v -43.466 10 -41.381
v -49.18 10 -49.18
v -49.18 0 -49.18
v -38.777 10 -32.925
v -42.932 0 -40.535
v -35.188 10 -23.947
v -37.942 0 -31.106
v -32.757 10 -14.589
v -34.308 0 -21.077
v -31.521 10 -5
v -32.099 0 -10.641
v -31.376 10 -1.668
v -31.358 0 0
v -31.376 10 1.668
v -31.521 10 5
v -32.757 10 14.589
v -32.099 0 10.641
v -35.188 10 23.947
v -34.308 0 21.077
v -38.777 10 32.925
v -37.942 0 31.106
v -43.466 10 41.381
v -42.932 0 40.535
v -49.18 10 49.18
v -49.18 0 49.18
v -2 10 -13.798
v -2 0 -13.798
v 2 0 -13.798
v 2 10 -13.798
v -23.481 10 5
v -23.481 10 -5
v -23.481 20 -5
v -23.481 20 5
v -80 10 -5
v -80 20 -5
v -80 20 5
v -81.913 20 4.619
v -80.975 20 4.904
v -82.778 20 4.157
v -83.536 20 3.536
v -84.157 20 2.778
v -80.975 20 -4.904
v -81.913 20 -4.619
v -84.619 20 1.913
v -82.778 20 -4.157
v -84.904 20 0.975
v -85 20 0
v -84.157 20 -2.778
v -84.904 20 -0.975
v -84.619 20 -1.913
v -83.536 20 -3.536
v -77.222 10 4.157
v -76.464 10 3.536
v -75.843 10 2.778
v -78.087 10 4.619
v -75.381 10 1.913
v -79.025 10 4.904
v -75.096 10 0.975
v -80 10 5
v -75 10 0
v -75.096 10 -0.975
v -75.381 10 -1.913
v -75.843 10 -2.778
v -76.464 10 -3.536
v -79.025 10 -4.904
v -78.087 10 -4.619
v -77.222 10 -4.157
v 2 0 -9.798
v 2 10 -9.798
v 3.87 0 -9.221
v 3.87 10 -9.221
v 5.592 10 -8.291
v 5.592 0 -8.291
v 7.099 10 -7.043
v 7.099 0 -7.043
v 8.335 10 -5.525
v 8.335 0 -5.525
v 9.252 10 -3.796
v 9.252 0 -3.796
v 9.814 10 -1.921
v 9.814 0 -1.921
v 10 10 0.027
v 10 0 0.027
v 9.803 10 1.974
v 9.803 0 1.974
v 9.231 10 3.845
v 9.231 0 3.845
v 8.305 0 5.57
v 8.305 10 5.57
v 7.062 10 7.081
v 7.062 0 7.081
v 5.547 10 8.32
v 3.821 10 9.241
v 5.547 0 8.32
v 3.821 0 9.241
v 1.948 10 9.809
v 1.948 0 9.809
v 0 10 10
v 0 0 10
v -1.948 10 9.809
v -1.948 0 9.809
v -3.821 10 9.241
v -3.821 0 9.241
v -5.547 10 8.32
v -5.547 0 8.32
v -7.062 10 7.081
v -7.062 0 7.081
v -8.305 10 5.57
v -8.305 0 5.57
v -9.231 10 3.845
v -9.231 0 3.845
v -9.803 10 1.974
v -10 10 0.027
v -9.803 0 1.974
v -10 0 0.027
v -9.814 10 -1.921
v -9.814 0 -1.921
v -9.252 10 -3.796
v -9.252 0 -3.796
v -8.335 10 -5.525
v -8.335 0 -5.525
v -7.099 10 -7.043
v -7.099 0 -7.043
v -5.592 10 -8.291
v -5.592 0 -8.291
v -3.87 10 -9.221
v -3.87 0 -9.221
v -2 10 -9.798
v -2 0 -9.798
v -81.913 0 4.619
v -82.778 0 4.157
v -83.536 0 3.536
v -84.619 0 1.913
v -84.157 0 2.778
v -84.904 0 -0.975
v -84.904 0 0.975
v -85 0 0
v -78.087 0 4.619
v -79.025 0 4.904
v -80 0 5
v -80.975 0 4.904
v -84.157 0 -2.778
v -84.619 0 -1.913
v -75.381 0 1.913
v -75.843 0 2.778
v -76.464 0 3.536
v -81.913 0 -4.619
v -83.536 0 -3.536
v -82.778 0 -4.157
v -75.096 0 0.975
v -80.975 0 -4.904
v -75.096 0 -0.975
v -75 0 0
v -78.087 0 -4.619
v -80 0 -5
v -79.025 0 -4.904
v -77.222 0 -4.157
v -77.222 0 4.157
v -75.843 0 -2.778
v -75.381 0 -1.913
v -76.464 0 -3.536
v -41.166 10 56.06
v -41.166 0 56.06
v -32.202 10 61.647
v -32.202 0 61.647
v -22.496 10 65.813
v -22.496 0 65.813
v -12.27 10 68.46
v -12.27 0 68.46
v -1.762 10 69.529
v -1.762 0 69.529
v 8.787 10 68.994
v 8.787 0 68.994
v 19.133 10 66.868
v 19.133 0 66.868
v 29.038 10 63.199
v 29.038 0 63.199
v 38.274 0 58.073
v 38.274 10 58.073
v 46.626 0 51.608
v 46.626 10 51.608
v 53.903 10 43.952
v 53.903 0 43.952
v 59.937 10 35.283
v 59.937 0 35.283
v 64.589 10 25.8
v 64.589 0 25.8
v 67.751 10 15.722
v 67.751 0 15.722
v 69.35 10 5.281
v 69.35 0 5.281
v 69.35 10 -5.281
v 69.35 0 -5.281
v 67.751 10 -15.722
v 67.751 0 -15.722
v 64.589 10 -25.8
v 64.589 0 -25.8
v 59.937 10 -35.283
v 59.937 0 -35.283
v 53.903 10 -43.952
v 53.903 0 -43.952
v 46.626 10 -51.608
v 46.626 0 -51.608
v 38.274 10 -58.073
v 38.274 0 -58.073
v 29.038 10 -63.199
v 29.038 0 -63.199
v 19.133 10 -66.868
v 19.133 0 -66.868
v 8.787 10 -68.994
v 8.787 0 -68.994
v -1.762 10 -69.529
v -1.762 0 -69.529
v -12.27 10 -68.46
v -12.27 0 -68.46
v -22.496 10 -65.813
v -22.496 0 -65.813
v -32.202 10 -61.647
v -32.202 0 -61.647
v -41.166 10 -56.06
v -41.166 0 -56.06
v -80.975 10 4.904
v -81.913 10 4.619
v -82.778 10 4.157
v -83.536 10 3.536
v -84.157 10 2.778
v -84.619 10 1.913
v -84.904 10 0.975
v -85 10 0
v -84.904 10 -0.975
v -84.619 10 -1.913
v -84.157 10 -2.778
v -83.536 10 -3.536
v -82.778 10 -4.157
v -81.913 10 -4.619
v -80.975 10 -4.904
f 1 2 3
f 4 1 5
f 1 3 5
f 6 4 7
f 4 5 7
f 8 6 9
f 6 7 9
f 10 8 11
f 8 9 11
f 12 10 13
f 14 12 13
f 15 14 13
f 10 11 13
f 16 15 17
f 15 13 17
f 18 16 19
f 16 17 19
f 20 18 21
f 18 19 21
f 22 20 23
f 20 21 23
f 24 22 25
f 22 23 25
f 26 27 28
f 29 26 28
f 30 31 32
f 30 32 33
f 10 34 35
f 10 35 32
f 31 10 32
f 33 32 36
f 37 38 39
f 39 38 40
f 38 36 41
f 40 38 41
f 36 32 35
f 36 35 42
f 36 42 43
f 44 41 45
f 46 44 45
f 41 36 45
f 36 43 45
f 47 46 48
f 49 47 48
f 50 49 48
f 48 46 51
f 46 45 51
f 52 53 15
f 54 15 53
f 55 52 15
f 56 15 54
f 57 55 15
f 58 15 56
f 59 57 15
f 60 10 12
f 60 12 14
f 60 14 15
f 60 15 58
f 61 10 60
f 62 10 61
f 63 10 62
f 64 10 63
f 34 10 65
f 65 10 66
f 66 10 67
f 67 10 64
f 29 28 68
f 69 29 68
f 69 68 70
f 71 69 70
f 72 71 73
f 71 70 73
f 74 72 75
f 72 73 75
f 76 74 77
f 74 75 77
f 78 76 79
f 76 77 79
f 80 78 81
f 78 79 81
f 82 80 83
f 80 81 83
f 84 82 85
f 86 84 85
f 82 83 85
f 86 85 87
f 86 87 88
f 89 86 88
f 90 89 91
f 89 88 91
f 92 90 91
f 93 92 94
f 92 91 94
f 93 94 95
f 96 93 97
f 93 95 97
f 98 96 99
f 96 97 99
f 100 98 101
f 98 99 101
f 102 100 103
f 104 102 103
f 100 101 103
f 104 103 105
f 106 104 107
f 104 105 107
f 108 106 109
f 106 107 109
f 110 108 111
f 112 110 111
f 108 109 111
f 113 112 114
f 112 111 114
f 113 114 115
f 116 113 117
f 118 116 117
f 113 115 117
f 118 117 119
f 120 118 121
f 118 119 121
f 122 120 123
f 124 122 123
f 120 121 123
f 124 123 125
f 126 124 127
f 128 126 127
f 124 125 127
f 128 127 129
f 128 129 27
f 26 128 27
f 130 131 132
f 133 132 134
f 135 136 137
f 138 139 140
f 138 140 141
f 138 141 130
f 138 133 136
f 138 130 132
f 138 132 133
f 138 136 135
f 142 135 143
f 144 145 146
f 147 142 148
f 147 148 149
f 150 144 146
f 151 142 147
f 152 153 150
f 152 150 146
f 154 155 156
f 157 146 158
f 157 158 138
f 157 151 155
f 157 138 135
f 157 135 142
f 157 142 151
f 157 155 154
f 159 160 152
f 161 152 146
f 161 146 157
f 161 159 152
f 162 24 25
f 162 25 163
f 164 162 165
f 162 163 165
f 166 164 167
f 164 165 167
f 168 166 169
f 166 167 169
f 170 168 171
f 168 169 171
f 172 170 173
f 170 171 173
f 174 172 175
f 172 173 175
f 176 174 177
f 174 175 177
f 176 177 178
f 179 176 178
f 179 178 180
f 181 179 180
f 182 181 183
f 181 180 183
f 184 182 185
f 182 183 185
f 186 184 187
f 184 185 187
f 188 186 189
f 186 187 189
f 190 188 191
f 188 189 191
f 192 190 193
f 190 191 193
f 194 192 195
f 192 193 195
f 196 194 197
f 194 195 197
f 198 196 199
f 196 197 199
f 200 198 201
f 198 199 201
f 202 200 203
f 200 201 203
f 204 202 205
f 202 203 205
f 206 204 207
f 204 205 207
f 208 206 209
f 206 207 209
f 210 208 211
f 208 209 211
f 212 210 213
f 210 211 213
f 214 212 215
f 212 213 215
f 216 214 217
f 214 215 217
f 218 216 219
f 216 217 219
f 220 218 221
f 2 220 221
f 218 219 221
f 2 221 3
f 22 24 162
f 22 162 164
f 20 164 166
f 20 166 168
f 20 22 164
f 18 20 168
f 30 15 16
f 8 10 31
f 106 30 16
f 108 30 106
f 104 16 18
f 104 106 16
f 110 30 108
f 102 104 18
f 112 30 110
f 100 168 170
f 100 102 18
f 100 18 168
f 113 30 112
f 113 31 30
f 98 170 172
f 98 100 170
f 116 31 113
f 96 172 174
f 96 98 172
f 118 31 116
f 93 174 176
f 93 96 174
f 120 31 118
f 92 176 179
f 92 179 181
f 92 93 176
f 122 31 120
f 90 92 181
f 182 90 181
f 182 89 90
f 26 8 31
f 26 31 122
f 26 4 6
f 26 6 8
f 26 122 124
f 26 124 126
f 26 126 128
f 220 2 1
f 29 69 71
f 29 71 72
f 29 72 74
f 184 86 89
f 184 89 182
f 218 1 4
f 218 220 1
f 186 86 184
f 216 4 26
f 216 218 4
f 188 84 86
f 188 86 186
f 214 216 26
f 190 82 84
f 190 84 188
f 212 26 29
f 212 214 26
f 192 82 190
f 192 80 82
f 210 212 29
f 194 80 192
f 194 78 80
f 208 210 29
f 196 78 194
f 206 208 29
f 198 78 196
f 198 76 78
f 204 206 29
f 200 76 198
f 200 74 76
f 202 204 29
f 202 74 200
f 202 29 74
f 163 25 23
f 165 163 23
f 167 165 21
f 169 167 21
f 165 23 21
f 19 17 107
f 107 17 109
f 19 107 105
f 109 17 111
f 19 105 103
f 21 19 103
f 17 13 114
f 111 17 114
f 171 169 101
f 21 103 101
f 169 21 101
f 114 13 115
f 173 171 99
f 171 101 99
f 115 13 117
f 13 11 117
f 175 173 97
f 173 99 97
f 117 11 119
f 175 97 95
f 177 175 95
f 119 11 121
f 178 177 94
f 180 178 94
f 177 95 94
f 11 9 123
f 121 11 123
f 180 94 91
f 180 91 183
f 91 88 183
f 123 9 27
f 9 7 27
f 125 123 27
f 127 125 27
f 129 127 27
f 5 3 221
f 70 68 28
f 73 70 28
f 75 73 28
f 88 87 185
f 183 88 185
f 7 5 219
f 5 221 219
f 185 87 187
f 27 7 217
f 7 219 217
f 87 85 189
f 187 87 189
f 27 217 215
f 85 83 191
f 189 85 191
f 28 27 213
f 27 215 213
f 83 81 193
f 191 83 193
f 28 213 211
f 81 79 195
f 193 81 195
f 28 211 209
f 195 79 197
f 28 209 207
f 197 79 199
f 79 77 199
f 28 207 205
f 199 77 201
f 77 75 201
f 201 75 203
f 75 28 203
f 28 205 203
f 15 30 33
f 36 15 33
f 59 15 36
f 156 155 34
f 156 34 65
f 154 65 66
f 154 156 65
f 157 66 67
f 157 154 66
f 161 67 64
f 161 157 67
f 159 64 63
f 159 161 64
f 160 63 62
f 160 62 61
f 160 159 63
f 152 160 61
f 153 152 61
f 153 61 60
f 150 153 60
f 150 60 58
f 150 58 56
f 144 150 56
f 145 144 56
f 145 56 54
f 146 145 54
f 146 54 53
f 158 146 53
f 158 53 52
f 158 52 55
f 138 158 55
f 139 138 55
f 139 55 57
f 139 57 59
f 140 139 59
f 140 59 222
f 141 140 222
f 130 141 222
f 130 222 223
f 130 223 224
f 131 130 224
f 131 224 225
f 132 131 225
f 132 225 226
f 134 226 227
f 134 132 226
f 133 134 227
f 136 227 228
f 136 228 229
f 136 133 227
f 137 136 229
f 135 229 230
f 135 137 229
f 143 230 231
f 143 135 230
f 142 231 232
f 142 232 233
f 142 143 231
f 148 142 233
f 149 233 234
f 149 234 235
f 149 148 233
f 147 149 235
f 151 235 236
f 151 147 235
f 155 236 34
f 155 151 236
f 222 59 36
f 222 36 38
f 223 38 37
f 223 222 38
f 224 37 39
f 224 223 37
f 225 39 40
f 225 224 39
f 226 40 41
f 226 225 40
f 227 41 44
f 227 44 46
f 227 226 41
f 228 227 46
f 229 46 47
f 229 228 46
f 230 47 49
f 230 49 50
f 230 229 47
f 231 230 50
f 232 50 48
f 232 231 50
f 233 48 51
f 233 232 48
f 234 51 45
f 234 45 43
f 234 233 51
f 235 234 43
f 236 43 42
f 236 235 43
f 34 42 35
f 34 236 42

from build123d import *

# Parameters (mm, degrees)
EXTRUDE_1_DEPTH = 10
EXTRUDE_5_DEPTH = 10
EXTRUDE_START   = 10
SKETCH_5_R      = 5
EXTRUDE_6_DEPTH = 10


with BuildPart() as part:
    # 草图1 → 凸台-拉伸1 (new body)
    with BuildSketch(Plane(origin=(0, 0, 0), x_dir=(1, 0, 0), z_dir=(0, 1, 0))):
        with BuildLine():
            ThreePointArc((-49.180194883, -49.180194883), (69.551298604, 0), (-49.180194883, 49.180194883))
            ThreePointArc((-49.180194883, 49.180194883), (-31.357669024, 0), (-49.180194883, -49.180194883))
        make_face()
        with BuildLine():
            Line((-2, 9.797958971), (-2, 13.797958971))
            Line((-2, 13.797958971), (2, 13.797958971))
            Line((2, 13.797958971), (2, 9.797958971))
            ThreePointArc((2, 9.797958971), (0, -10), (-2, 9.797958971))
        make_face(mode=Mode.SUBTRACT)
    extrude(amount=EXTRUDE_1_DEPTH)

    # 草图4 → 凸台-拉伸5 (add)
    with BuildSketch(Plane(origin=(0, 10, 0), x_dir=(1, 0, 0), z_dir=(0, 1, 0))):
        with BuildLine():
            Line((-80, 5), (-23.481338819, 5))
            Line((-23.481338819, 5), (-23.481338819, -5))
            Line((-23.481338819, -5), (-80, -5))
            ThreePointArc((-80, -5), (-85, 0), (-80, 5))
        make_face()
    extrude(amount=EXTRUDE_5_DEPTH)

    # 草图5 → 凸台-拉伸6 (add)
    with BuildSketch(Plane.XZ.offset(-10).offset(EXTRUDE_START)):
        with Locations(Location((-80, 0, 0), (0, 0, 270))):
            Circle(SKETCH_5_R)
    extrude(amount=-EXTRUDE_6_DEPTH)


solid = part.part
